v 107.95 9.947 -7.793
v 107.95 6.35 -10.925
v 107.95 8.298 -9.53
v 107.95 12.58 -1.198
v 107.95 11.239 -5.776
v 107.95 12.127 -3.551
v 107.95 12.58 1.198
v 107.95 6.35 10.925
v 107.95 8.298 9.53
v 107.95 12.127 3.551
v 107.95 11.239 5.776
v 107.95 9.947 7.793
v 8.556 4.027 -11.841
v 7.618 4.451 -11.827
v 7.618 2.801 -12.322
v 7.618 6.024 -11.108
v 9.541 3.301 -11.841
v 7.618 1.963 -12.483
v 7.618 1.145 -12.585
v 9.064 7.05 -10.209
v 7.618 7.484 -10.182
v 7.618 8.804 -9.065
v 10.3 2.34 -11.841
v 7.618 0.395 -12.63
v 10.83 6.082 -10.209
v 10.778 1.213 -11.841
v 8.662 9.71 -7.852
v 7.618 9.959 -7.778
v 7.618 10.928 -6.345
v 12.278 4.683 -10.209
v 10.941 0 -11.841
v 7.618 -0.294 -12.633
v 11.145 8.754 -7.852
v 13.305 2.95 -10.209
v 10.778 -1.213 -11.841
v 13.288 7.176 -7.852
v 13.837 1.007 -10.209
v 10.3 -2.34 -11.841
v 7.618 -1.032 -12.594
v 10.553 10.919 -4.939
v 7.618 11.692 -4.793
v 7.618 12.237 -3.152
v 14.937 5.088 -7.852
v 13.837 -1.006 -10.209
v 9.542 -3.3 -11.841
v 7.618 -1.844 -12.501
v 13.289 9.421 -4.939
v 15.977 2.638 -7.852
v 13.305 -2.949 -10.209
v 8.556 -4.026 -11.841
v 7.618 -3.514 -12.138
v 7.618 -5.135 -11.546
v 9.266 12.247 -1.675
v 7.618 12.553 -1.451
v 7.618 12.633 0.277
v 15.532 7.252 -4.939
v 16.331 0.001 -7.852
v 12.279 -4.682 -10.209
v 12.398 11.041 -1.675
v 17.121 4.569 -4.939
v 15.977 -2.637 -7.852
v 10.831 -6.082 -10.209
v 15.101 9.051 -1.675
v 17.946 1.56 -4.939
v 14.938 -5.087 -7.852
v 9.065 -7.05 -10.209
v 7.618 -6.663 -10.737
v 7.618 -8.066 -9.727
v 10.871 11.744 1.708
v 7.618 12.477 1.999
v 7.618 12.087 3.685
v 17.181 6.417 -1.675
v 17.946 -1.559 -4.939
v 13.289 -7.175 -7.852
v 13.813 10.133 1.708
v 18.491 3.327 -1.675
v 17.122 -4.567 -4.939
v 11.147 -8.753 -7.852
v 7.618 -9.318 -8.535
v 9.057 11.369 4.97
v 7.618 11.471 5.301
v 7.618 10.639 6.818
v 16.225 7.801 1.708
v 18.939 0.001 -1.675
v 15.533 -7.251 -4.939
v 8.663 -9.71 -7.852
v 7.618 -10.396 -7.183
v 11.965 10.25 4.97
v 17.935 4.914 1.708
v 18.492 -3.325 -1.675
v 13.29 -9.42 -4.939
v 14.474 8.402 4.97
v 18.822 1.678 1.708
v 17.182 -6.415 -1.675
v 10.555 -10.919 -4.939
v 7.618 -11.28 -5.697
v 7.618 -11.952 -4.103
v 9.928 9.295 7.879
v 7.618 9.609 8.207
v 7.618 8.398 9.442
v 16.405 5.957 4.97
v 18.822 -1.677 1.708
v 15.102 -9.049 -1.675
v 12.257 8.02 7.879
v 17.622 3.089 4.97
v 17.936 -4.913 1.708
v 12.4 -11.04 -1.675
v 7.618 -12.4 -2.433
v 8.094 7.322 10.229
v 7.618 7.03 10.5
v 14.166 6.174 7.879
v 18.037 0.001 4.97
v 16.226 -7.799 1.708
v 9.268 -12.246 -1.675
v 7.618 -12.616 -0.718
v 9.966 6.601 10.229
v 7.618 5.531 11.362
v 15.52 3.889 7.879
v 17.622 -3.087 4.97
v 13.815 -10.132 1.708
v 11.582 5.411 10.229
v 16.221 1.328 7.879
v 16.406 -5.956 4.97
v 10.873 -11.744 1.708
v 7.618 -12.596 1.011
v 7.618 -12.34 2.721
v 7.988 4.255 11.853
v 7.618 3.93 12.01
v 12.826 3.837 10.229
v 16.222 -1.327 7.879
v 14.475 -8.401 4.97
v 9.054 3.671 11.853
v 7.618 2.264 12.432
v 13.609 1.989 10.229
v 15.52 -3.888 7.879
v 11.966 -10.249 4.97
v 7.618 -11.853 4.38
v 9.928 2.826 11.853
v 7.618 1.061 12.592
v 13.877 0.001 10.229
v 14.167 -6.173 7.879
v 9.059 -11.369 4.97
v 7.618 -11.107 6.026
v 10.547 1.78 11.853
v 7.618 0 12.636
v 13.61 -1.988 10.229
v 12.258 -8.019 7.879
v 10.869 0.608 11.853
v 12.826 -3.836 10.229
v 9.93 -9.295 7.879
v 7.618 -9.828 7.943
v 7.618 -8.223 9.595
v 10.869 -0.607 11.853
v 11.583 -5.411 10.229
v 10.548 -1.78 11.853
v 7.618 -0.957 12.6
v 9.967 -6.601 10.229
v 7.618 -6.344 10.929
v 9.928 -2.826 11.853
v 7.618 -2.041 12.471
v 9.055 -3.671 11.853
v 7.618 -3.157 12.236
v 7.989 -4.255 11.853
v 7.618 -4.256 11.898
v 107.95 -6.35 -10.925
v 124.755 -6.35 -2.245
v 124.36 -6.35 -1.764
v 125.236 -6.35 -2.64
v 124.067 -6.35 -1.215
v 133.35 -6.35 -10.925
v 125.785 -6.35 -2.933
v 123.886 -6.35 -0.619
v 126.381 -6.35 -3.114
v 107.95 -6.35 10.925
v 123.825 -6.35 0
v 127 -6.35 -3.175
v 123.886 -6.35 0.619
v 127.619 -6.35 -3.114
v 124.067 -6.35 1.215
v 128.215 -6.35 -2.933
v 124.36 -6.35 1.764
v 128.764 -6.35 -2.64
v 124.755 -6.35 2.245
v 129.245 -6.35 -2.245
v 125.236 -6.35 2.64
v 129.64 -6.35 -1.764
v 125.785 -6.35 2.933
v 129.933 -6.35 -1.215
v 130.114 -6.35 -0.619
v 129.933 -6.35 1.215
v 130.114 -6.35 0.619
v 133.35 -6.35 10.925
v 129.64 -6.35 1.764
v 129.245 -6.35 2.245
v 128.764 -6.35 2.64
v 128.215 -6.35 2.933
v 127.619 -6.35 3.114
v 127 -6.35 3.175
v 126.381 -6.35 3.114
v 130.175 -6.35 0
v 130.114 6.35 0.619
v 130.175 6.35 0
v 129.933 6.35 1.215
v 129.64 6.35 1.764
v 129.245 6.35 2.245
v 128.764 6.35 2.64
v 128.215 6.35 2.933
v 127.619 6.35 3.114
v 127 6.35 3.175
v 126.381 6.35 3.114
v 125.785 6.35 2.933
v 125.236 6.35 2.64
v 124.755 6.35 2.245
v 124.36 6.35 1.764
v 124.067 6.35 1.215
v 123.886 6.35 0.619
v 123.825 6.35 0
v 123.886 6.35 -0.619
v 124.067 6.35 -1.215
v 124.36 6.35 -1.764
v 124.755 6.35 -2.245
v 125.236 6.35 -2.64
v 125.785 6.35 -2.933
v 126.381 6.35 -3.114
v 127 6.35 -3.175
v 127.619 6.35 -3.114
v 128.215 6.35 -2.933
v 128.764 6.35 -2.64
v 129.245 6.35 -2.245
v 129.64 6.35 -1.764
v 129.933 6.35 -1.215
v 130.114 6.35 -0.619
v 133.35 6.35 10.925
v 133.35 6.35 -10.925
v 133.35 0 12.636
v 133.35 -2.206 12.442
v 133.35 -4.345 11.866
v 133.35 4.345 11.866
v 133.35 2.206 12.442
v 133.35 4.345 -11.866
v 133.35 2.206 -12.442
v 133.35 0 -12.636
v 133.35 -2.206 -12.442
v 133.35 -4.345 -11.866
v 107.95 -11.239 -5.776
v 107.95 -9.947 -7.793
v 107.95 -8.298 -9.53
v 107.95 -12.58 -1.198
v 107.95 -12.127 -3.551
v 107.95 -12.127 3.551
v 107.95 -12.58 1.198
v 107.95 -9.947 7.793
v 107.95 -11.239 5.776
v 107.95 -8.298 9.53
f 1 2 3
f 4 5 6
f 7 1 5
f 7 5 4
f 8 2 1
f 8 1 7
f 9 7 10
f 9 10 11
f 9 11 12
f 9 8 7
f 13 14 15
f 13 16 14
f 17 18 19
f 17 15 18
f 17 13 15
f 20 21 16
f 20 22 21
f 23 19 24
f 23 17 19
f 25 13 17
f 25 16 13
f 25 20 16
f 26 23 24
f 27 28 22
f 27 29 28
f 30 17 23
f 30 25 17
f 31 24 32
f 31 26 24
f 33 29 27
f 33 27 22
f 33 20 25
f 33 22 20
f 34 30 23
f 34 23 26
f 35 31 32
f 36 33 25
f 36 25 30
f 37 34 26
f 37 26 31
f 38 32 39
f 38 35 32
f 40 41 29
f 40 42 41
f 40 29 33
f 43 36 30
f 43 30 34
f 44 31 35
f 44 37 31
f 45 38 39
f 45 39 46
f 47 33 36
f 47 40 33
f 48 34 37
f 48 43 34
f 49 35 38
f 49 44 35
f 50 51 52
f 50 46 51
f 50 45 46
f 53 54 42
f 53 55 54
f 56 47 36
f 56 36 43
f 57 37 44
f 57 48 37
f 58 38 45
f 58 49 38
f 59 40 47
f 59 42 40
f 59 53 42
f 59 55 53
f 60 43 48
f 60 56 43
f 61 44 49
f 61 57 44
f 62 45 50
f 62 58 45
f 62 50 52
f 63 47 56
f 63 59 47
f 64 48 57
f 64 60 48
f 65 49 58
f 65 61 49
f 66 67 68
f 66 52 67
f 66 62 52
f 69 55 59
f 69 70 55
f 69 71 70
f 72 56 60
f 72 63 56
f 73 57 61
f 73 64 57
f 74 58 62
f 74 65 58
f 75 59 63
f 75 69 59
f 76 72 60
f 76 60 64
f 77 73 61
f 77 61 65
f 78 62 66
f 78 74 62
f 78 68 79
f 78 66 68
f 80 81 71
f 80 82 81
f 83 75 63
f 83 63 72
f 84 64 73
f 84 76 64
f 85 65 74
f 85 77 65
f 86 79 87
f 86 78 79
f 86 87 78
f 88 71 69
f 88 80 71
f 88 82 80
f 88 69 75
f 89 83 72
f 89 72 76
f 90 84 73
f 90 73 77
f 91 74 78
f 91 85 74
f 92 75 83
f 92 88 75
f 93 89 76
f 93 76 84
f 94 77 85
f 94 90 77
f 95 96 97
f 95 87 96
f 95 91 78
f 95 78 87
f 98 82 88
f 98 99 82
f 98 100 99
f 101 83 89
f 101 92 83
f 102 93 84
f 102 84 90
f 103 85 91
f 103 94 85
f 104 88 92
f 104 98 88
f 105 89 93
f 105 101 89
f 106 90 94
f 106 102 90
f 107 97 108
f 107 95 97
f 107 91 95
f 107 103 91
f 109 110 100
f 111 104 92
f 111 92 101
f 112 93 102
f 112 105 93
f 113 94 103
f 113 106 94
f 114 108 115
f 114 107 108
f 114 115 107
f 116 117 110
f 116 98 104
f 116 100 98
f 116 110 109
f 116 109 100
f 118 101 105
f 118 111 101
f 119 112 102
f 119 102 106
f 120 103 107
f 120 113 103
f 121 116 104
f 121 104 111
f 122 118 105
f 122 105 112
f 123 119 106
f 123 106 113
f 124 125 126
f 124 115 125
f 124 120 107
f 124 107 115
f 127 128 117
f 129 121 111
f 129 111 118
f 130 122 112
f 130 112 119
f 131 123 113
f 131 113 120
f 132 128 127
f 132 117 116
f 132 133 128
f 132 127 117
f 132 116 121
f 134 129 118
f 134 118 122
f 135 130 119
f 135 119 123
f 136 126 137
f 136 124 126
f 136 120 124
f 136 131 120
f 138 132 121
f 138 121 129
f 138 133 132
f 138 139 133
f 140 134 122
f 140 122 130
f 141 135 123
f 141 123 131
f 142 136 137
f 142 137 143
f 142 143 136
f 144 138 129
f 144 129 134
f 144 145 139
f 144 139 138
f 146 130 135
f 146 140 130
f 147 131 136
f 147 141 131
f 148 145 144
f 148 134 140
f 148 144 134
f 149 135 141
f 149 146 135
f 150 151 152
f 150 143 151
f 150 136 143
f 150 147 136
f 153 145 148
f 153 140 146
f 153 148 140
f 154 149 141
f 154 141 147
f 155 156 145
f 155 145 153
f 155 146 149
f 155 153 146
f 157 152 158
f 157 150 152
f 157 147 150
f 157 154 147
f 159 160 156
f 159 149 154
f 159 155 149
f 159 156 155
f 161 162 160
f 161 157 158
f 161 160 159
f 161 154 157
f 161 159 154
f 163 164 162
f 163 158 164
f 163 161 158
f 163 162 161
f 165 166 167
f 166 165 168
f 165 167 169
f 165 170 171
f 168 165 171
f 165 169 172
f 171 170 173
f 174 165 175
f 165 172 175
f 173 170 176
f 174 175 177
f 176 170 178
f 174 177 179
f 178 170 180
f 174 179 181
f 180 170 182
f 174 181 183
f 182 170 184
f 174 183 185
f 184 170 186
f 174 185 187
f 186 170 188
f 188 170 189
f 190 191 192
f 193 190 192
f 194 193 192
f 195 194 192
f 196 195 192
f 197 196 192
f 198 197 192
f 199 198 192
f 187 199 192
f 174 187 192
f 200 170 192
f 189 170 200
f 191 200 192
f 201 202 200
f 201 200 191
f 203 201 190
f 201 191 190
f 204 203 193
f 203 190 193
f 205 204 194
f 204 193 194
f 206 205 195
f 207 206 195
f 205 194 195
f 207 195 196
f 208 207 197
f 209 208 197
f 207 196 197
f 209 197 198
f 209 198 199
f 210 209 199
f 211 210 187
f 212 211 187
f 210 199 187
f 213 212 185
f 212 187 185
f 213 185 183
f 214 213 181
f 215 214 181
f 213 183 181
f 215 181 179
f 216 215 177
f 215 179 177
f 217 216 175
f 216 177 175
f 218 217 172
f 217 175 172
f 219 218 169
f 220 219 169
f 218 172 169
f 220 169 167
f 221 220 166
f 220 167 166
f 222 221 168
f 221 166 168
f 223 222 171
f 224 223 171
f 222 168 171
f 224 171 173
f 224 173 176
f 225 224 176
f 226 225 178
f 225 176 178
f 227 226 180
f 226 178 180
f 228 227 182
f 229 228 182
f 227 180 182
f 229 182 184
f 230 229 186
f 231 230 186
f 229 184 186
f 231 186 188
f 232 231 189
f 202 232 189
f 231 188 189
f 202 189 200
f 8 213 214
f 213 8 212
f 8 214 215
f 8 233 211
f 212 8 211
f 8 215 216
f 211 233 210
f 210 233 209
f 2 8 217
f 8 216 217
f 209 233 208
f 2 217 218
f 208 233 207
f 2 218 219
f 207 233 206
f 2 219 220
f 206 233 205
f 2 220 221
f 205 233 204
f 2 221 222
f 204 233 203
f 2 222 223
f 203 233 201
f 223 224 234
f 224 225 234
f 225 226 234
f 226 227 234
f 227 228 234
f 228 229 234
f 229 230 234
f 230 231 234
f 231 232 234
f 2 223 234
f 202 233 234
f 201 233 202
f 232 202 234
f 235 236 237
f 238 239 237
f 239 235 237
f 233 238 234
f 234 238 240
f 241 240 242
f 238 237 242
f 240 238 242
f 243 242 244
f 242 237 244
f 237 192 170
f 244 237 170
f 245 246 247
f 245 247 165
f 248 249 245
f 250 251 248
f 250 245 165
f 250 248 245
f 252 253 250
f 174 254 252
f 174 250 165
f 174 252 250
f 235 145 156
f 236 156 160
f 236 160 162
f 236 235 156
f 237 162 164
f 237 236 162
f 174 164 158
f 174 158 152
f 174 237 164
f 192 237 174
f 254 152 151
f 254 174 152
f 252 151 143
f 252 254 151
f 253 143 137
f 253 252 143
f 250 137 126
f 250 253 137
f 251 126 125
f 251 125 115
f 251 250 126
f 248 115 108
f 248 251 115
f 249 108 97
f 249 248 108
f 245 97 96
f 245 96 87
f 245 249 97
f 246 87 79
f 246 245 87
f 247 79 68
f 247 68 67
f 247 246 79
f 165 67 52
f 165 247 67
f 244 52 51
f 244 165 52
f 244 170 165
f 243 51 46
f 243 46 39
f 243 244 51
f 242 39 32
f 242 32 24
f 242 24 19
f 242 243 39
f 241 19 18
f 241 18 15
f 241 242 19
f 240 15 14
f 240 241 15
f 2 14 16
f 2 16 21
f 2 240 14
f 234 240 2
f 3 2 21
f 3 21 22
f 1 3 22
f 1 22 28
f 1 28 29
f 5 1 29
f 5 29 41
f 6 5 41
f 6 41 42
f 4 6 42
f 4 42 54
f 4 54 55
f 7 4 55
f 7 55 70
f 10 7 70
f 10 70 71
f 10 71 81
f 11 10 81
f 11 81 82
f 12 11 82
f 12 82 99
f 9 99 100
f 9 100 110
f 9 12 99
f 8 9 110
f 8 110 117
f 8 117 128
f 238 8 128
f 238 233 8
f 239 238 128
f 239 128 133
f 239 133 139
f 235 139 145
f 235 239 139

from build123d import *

# Parameters (mm, degrees)
F0_W     = 127
F0_H     = 12.6365
F3_DEPTH = 25.4
F4_R     = 3.175
F5_DEPTH = 12.7


with BuildPart() as f1:
    # F0 (on Front) → F1 (revolve)
    with BuildSketch(Plane.XZ):
        with Locations((69.85, 6.31825)):
            Rectangle(F0_W, F0_H)
    revolve(axis=Axis((-3.592643, 0, 0), (1, 0, 0)))

    # F2 (on face) → F3 (cut)
    with BuildSketch(Plane.YZ.offset(133.35)):
        with BuildLine():
            ThreePointArc((6.35, -10.998523), (12.7, 0), (6.35, 10.998523))
            Line((6.35, 10.998523), (6.35, -10.998523))
        make_face()
        with BuildLine():
            Line((-6.35, -10.998523), (-6.35, 10.998523))
            ThreePointArc((-6.35, 10.998523), (-12.7, 0), (-6.35, -10.998523))
        make_face()
    extrude(amount=-F3_DEPTH, mode=Mode.SUBTRACT)

    # F4 (on Front) → F5 (cut, symmetric)
    with BuildSketch(Plane.XZ):
        with Locations((127, 0)):
            Circle(F4_R)
    extrude(amount=F5_DEPTH, both=True, mode=Mode.SUBTRACT)

    # F6 (on face) → F7 (revolve, cut)
    with BuildSketch(Plane(origin=(6.35, 0, 0), x_dir=(0, -1, 0), z_dir=(-1, 0, 0))):
        with BuildLine():
            Line((0, 12.7), (0, -12.7))
            ThreePointArc((0, -12.7), (12.7, 0), (0, 12.7))
        make_face()
    revolve(axis=Axis((6.35, 0, -4.069372), (0, 0, -1)), mode=Mode.SUBTRACT)


solid = f1.part
